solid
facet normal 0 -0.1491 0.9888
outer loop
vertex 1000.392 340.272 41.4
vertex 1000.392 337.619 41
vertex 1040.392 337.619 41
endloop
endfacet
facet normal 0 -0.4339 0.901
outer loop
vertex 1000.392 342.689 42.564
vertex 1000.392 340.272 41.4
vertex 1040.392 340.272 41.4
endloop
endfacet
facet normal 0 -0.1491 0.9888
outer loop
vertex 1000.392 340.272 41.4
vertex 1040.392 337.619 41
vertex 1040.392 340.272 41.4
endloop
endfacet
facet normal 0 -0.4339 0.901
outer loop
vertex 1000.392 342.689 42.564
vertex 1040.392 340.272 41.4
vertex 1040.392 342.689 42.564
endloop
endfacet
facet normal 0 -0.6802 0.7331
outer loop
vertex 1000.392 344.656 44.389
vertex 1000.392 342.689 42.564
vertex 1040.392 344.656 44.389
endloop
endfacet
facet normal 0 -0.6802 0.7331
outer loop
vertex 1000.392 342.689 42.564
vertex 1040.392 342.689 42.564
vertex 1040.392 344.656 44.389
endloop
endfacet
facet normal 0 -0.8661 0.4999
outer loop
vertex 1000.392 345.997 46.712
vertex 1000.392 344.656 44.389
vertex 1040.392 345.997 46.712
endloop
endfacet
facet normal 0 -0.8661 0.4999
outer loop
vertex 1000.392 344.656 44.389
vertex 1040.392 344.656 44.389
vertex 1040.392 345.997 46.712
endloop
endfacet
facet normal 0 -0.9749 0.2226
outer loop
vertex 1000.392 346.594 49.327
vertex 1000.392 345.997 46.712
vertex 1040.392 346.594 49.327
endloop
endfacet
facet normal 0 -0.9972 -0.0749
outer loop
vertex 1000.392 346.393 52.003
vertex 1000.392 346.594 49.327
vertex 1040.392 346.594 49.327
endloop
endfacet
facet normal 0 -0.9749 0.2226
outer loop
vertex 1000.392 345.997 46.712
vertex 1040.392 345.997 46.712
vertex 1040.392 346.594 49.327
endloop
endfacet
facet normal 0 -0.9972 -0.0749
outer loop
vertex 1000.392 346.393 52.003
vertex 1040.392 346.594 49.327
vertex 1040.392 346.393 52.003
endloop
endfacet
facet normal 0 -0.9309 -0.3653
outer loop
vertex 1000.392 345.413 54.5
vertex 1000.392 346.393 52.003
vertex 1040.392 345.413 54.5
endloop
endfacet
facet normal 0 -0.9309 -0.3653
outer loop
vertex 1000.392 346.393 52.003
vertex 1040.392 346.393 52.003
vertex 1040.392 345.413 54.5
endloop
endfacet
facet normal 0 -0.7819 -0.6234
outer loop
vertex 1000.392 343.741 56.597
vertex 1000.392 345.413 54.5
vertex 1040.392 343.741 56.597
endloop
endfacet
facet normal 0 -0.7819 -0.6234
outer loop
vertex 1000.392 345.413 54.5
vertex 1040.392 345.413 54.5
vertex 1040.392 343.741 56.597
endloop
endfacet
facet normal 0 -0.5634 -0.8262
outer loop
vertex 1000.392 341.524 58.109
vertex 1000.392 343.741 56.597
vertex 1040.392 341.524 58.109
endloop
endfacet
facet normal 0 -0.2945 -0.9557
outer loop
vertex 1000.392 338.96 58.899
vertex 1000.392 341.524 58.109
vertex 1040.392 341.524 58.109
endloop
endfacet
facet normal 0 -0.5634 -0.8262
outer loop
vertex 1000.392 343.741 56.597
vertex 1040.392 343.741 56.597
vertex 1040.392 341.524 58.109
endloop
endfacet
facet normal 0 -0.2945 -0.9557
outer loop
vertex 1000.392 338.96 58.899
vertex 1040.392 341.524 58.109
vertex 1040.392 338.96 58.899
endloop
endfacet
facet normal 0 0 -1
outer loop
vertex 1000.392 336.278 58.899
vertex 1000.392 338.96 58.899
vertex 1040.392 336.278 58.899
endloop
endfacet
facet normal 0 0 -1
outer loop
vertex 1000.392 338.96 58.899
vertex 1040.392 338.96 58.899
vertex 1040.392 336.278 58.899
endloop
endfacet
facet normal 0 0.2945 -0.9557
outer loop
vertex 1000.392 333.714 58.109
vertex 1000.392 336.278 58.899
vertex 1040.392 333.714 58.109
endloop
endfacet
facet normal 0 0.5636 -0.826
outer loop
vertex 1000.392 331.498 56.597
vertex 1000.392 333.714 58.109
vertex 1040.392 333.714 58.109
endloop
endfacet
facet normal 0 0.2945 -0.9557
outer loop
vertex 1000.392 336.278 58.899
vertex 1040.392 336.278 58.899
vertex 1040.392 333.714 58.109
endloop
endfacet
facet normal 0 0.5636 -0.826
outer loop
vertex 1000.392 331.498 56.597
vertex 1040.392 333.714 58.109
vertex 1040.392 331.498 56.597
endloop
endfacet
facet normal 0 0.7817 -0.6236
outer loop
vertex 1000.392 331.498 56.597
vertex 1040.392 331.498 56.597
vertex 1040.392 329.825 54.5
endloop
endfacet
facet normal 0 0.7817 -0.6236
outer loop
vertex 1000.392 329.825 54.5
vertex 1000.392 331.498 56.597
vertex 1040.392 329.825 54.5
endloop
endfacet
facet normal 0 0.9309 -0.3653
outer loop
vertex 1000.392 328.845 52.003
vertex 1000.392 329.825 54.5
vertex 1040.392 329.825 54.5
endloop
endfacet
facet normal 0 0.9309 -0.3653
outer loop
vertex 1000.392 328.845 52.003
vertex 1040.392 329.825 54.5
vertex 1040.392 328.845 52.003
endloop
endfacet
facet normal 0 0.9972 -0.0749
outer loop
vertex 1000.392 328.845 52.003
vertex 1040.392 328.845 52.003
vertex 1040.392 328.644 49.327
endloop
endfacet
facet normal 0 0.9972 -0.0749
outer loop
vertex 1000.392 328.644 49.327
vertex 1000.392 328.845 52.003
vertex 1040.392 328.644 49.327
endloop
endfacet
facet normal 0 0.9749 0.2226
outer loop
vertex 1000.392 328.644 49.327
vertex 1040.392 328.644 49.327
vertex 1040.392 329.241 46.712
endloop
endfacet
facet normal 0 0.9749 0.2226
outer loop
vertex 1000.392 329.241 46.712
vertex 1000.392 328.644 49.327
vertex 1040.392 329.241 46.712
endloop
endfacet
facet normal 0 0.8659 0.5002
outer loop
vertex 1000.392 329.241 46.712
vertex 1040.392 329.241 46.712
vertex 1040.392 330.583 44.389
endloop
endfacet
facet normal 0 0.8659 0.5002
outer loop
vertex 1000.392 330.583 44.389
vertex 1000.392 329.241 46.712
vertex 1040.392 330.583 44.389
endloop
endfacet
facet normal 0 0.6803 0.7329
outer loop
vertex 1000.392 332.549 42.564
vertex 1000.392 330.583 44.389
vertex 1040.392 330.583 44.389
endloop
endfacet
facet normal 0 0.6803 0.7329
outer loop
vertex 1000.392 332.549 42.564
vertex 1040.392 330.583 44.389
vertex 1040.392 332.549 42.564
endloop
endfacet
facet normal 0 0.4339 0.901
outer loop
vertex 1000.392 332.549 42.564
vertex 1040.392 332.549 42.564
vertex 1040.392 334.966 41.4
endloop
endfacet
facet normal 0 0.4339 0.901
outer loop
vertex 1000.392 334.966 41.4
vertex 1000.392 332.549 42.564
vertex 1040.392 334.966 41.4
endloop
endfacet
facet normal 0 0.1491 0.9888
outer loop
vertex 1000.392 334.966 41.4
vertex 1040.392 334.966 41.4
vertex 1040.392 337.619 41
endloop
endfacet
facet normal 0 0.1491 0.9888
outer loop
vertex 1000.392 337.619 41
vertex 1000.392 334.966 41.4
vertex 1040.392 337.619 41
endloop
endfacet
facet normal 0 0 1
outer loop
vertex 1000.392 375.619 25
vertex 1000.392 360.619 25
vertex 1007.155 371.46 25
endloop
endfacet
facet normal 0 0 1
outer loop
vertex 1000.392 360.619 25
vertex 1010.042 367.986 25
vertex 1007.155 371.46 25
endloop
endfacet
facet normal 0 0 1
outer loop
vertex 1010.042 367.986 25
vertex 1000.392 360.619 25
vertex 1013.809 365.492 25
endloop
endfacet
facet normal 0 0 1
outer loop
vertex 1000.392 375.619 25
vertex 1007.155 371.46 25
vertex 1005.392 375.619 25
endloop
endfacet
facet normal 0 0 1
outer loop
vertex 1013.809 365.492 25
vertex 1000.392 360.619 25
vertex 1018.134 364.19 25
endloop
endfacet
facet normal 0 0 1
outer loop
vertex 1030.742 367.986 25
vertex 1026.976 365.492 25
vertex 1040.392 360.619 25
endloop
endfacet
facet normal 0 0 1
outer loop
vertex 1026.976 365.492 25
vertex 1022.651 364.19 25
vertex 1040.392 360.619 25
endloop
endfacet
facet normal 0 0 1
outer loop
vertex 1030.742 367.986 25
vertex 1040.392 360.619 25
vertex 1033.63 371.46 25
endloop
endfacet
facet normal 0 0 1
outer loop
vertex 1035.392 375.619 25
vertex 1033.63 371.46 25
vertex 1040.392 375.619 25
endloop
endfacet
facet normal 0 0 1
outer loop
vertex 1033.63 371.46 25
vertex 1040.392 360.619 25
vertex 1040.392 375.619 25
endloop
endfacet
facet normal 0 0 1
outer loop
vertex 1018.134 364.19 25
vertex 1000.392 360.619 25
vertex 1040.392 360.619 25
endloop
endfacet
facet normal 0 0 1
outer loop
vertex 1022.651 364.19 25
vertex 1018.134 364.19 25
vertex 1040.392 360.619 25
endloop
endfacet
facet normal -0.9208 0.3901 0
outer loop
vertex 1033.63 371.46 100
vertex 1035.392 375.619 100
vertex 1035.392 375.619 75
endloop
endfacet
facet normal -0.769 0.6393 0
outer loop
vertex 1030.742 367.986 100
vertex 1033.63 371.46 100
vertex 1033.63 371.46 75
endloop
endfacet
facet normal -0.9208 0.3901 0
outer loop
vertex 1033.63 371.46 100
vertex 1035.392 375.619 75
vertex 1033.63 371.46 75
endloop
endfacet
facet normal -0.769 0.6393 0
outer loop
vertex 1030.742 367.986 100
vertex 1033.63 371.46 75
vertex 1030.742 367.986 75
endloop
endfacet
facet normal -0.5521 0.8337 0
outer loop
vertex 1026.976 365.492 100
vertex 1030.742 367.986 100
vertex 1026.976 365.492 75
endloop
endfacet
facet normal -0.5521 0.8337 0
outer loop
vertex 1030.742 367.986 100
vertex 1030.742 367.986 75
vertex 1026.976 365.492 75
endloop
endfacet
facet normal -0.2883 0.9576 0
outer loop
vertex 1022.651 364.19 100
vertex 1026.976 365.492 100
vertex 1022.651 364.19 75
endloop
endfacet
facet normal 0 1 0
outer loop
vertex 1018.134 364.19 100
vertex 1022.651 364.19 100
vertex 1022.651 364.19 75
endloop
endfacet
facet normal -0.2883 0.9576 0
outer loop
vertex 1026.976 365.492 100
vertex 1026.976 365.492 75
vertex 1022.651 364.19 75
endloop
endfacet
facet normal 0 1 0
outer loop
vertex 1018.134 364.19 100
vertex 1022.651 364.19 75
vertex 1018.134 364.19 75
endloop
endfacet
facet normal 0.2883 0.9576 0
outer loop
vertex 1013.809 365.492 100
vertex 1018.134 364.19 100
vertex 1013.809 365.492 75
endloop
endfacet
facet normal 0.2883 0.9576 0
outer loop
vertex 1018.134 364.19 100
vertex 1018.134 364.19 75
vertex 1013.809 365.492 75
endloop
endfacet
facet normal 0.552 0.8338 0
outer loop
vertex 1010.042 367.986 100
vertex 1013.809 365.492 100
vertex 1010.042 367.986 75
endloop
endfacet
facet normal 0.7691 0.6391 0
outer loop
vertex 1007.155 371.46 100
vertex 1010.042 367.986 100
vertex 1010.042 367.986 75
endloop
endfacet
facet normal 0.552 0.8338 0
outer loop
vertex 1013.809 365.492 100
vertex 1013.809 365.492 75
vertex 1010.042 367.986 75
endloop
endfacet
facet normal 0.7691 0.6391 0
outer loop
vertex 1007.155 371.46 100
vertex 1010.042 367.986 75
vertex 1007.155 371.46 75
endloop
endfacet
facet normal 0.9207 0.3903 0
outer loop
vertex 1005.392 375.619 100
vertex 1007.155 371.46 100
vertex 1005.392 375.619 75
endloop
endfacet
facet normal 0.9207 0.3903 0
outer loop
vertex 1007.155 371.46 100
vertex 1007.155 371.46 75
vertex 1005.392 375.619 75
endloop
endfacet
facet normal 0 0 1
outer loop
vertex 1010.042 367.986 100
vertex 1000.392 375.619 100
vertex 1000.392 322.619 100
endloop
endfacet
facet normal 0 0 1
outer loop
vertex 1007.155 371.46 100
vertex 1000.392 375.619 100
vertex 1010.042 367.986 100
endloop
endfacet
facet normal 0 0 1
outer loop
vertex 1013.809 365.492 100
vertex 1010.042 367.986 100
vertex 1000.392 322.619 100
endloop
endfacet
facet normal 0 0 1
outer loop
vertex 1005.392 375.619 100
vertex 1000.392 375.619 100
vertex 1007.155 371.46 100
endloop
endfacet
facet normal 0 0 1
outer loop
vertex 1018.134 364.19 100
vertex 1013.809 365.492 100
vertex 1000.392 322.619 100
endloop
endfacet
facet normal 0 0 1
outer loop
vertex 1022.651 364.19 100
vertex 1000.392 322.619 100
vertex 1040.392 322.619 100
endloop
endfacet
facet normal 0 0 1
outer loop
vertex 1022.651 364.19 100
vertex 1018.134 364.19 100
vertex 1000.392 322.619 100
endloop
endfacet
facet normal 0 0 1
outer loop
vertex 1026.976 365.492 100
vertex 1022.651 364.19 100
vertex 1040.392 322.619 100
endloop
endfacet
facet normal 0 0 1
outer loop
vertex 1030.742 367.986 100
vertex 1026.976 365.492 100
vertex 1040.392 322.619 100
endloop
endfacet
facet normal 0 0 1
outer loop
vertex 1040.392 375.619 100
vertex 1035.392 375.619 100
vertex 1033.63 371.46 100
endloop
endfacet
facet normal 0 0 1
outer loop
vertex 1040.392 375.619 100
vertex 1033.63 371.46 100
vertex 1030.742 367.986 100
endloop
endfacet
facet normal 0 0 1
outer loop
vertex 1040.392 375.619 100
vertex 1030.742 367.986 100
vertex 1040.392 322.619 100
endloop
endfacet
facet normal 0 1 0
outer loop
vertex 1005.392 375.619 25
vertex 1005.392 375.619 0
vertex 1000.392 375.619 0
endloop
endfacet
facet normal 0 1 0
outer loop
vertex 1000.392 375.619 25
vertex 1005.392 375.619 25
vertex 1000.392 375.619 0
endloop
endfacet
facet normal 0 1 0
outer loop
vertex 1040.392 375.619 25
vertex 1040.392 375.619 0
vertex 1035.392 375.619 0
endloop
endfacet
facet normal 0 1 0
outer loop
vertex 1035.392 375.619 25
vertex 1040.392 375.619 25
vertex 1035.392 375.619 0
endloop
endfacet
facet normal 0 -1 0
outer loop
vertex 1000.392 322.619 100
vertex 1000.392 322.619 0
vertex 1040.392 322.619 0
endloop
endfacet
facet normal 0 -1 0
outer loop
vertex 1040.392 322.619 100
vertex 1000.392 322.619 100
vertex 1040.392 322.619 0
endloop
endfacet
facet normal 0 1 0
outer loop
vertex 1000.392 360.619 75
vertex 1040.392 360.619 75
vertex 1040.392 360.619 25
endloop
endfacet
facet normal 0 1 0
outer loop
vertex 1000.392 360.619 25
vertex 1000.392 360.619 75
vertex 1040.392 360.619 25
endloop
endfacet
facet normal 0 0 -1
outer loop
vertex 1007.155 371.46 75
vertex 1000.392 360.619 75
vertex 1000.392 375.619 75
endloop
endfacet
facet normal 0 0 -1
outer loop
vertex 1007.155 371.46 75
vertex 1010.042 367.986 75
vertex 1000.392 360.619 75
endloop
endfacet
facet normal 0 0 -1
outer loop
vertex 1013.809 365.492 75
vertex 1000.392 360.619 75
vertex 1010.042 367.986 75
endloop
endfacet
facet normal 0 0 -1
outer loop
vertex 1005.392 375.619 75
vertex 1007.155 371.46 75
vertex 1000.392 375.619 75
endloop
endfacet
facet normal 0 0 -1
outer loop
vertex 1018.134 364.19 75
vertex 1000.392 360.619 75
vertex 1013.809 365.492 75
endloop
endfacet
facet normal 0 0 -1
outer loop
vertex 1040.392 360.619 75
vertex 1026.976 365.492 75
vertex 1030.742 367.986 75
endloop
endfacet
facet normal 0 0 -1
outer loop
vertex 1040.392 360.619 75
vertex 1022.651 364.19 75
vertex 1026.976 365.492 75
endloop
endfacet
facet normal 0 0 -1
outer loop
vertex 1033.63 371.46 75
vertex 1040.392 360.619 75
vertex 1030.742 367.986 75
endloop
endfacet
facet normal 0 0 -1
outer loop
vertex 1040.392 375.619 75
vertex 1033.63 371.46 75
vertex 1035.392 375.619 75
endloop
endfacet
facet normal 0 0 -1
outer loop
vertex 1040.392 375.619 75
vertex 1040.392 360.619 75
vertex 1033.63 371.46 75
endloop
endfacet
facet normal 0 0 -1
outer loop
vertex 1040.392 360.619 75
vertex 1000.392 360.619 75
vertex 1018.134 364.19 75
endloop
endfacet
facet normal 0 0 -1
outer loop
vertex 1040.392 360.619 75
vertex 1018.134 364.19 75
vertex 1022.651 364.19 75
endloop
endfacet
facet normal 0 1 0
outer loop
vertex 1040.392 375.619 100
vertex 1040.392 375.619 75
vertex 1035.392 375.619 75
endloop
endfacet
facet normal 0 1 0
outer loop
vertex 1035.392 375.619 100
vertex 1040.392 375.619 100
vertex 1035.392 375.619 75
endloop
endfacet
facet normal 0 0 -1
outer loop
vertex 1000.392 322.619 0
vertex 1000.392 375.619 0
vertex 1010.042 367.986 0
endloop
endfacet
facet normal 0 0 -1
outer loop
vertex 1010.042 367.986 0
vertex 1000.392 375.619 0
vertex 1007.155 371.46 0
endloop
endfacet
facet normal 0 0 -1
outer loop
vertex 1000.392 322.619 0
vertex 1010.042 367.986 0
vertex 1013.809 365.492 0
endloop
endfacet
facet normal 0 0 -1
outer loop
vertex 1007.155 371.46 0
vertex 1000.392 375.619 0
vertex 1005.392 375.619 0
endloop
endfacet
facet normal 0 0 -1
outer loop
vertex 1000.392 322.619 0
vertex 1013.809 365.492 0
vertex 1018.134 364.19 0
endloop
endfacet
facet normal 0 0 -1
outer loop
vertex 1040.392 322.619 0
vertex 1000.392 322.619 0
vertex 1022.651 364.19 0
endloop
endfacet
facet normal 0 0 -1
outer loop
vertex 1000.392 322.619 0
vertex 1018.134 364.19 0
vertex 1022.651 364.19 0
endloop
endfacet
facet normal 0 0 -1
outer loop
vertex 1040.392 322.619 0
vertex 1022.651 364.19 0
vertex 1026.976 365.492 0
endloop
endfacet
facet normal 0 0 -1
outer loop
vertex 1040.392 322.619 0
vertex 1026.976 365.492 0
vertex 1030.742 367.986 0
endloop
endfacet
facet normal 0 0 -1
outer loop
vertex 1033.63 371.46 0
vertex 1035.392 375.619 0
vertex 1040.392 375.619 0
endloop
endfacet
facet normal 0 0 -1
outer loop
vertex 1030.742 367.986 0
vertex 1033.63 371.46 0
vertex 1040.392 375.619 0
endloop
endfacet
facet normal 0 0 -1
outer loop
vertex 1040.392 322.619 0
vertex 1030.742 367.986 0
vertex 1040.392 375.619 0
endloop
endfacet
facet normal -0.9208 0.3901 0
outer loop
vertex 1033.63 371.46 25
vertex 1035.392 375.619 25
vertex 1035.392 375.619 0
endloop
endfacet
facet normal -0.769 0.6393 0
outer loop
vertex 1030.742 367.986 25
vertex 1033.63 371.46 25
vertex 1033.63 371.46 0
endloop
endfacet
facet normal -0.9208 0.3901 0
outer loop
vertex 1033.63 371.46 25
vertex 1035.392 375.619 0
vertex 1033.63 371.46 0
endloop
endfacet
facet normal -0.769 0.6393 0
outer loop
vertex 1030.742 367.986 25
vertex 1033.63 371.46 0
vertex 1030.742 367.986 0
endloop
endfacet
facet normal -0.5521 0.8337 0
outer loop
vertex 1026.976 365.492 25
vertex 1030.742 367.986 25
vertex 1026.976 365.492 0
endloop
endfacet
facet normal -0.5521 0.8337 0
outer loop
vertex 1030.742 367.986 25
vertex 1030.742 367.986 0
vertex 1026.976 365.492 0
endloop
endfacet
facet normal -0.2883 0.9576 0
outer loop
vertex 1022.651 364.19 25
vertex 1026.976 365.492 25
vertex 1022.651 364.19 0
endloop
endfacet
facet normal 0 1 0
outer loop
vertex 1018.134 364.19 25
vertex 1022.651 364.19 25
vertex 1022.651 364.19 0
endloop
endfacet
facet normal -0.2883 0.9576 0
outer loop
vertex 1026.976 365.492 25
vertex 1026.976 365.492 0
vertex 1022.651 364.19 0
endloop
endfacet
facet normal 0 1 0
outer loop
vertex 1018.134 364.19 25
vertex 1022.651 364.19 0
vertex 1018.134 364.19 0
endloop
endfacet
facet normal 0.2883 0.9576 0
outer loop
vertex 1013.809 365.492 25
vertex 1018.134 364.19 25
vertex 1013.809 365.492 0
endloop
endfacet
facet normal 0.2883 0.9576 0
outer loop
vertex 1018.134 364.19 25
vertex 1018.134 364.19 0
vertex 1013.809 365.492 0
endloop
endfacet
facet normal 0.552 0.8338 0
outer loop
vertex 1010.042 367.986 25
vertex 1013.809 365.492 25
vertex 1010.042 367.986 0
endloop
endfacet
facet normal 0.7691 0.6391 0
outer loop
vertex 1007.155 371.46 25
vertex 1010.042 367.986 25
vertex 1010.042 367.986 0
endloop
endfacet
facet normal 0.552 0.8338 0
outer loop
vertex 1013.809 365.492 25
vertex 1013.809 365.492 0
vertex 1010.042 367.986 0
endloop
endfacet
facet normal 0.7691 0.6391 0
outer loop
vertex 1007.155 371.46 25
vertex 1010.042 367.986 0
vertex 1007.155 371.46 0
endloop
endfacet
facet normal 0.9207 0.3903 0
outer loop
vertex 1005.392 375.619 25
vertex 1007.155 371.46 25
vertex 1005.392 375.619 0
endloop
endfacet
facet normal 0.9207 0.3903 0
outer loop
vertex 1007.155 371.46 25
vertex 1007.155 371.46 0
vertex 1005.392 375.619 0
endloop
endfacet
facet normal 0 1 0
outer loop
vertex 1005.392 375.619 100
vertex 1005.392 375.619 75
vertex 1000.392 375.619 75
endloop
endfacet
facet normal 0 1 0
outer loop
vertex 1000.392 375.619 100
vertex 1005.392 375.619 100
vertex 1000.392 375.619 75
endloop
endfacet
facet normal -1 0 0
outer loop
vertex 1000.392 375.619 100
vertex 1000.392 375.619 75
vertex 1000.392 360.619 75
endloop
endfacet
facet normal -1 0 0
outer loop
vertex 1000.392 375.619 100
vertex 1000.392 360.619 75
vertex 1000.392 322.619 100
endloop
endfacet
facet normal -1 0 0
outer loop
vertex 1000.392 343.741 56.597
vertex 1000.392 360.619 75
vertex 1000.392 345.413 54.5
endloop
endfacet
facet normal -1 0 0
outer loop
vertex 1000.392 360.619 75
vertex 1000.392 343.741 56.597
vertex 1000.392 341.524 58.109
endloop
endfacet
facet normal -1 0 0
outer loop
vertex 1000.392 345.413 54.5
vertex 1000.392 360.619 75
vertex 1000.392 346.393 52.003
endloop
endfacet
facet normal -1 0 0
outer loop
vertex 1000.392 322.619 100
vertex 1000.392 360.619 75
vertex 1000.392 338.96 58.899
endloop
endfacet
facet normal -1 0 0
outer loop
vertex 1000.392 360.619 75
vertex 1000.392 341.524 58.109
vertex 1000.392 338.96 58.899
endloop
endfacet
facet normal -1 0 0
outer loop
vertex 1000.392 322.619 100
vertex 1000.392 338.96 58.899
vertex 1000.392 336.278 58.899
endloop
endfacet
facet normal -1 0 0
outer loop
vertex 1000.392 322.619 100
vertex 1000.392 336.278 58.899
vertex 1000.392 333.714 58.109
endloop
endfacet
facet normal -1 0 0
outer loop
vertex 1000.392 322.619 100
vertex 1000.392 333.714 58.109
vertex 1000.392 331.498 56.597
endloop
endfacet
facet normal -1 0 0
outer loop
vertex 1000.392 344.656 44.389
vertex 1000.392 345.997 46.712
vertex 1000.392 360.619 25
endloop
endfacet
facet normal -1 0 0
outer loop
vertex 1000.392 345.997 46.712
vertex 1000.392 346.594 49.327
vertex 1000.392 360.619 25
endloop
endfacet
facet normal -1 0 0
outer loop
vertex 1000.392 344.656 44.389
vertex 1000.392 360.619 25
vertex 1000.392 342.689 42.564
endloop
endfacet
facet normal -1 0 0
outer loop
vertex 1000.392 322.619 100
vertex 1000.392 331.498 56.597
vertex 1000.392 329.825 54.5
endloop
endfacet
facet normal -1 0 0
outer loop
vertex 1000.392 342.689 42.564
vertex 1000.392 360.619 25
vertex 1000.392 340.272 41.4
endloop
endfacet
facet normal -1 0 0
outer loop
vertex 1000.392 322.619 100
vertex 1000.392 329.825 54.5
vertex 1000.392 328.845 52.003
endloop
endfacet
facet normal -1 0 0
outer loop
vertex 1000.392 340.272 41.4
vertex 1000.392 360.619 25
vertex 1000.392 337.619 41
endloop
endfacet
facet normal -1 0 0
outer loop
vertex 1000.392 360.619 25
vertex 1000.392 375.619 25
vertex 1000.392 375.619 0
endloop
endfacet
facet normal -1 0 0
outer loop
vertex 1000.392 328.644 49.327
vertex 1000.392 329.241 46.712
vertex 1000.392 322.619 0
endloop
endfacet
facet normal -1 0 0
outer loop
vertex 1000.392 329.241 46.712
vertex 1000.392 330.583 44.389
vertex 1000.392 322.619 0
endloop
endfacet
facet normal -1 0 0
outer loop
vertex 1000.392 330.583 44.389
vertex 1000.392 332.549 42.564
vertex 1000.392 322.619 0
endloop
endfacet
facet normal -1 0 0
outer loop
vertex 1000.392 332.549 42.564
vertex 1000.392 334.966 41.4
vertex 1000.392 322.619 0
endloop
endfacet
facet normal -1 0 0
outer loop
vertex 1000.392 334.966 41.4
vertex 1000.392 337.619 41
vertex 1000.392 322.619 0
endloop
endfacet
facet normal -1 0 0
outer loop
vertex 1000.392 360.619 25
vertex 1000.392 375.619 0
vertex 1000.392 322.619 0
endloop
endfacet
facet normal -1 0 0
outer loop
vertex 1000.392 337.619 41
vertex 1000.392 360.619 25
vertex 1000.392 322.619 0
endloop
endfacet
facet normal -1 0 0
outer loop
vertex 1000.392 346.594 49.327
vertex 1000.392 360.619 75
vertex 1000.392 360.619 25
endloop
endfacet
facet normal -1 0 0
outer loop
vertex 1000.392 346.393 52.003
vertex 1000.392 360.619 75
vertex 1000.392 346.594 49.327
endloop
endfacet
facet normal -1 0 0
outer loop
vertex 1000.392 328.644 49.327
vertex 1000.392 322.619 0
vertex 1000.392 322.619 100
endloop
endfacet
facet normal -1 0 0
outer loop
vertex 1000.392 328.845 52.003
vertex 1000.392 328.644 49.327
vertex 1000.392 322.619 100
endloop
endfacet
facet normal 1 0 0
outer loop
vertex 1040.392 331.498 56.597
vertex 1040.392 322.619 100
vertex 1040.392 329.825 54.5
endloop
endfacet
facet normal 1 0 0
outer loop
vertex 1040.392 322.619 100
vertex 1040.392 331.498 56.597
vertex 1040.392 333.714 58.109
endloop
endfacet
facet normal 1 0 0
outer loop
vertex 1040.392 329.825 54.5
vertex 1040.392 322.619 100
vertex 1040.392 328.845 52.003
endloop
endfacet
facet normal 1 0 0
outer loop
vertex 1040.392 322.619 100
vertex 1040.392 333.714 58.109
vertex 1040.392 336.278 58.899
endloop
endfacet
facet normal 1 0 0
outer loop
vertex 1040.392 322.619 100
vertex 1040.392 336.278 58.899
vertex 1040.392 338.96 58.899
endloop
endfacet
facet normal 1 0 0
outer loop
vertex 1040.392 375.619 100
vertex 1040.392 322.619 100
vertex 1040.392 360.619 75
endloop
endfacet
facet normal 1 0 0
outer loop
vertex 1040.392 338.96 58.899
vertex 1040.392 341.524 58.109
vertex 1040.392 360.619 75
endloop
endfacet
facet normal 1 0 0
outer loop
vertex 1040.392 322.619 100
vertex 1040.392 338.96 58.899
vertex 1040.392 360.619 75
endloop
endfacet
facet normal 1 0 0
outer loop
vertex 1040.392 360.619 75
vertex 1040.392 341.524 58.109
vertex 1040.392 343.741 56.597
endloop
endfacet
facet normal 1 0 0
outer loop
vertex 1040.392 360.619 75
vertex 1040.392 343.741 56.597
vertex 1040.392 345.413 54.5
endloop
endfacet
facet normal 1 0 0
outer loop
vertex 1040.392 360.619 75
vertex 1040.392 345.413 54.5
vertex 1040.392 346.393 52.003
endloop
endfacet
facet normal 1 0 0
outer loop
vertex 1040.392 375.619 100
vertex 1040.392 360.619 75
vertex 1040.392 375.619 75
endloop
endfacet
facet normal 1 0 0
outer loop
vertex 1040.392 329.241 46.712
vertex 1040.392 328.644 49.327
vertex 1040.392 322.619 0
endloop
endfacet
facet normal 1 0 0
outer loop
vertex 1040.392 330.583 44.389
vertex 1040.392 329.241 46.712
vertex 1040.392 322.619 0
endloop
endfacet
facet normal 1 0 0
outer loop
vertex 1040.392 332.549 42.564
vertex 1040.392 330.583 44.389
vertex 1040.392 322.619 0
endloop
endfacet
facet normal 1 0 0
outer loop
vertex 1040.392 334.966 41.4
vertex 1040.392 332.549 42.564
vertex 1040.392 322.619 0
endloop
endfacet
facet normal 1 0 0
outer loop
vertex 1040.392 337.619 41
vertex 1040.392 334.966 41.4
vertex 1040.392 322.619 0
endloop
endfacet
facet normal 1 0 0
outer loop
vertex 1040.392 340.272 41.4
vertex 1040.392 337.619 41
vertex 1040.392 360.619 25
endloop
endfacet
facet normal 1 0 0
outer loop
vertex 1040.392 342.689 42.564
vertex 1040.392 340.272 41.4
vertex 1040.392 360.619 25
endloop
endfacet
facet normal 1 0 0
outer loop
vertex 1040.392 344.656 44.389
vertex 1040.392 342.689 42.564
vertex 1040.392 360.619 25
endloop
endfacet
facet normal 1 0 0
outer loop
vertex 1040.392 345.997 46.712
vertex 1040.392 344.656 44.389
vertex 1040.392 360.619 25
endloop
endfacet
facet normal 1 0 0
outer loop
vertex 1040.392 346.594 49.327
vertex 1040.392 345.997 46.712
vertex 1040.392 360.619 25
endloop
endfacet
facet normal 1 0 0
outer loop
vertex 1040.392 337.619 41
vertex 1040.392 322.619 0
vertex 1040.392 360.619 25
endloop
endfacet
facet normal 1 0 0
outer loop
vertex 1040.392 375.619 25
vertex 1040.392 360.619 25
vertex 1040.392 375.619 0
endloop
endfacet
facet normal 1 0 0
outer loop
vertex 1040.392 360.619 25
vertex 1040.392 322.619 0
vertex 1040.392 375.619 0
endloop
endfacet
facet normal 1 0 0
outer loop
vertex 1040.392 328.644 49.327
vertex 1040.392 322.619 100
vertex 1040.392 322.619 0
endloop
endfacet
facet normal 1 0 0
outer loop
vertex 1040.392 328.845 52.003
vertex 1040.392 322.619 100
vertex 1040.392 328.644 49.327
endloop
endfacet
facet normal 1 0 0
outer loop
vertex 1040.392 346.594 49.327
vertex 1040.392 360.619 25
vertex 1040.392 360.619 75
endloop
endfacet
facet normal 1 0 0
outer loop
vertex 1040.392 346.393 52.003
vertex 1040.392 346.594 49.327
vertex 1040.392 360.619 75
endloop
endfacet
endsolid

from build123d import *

# Parameters (mm, degrees)
BOSS_EXTRU_1_DEPTH      = 100
ESQUISSE2_R             = 9
ESQUISSE2_W             = 50
ESQUISSE2_H             = 15
ENL_V_MAT_EXTRU_1_DEPTH = 100


with BuildPart() as part:
    # Esquisse1 → Boss.-Extru.1 (new body)
    with BuildSketch(Plane.XY):
        with BuildLine():
            Line((1005.392443992, 375.619056085), (1000.392443992, 375.619056085))
            Line((1000.392443992, 375.619056085), (1000.392443992, 322.619056085))
            Line((1000.392443992, 322.619056085), (1040.392443992, 322.619056085))
            Line((1040.392443992, 322.619056085), (1040.392443992, 375.619056085))
            Line((1040.392443992, 375.619056085), (1035.392443992, 375.619056085))
            ThreePointArc((1035.392443992, 375.619056085), (1020.392443992, 364.024180923), (1005.392443992, 375.619056085))
        make_face()
    extrude(amount=BOSS_EXTRU_1_DEPTH)

    # Esquisse2 → Enlèv. mat.-Extru.1 (cut)
    with BuildSketch(Plane(origin=(1040.392443992, 0, 0), x_dir=(0, 0, -1), z_dir=(1, 0, 0))):
        with Locations((-50, 337.619056085)):
            Circle(ESQUISSE2_R)
        with Locations((-50, 368.119056085)):
            Rectangle(ESQUISSE2_W, ESQUISSE2_H)
    extrude(amount=-ENL_V_MAT_EXTRU_1_DEPTH, mode=Mode.SUBTRACT)


solid = part.part
